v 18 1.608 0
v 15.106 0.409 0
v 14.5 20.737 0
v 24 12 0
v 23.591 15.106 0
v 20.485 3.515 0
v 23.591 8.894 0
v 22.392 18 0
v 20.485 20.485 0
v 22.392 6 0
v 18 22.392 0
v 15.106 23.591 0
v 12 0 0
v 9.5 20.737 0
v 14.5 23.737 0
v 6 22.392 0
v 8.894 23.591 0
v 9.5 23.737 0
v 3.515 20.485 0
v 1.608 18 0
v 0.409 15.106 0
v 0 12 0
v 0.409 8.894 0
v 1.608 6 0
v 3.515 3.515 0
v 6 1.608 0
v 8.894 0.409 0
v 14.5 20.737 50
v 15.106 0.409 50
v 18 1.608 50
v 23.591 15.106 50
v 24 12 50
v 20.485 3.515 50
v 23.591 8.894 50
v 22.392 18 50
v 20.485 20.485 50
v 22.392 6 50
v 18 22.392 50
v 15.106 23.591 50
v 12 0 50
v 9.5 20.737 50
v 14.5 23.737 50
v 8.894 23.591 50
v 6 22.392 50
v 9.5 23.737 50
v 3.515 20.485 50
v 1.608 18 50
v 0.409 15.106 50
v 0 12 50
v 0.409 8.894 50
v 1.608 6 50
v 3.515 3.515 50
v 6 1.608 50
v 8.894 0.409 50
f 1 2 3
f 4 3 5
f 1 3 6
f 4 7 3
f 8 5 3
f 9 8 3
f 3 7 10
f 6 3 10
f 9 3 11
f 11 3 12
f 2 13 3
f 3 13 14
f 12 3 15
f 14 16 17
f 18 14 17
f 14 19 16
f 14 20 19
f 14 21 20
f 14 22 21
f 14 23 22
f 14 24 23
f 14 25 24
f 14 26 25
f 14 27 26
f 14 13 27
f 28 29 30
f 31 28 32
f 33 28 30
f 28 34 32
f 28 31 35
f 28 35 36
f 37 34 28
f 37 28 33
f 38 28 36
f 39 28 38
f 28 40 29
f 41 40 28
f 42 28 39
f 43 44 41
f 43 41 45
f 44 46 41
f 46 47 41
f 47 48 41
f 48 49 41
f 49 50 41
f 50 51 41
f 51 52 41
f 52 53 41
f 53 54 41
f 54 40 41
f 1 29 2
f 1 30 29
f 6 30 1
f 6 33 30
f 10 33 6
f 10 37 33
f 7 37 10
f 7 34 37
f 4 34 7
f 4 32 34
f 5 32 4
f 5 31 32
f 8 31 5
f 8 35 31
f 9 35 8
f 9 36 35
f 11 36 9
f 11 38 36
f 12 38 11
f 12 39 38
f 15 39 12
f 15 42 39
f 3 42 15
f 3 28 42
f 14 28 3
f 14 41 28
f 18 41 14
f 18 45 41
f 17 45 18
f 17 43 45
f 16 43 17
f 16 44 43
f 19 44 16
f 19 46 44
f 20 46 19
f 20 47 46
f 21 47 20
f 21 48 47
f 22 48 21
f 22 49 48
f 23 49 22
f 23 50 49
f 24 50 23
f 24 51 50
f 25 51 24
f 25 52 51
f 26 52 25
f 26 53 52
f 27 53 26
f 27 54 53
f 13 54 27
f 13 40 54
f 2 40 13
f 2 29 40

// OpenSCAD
$fn = 32;

// ----------------------------------------------------------------------
// Keyway shaft: d24 shaft, key 5 x 3 mm
// ----------------------------------------------------------------------

// --- parameters (mm) ---
shaft_r = 12;             // shaft radius
key_w = 5;                // keyway width
key_d = 3;                // keyway depth below the surface line
plate_t = 50;             // shaft length, Z (extrusion height)

shaft_d = 2 * shaft_r;  // shaft diameter
circle_step = 15;  // polygon sampling step, degrees

profile = [[8.894, 23.591], [6, 22.392], [3.515, 20.485], [1.608, 18], [0.409, 15.106], [0, 12], [0.409, 8.894], [1.608, 6], [3.515, 3.515], [6, 1.608], [8.894, 0.409], [12, 0], [15.106, 0.409], [18, 1.608], [20.485, 3.515], [22.392, 6], [23.591, 8.894], [24, 12], [23.591, 15.106], [22.392, 18], [20.485, 20.485], [18, 22.392], [15.106, 23.591], [14.5, 23.737], [14.5, 20.737], [9.5, 20.737], [9.5, 23.737]];  // primary outline, 27 points, counter clockwise

// --- the one profile operation ---
linear_extrude(height = plate_t) polygon(points = profile);
